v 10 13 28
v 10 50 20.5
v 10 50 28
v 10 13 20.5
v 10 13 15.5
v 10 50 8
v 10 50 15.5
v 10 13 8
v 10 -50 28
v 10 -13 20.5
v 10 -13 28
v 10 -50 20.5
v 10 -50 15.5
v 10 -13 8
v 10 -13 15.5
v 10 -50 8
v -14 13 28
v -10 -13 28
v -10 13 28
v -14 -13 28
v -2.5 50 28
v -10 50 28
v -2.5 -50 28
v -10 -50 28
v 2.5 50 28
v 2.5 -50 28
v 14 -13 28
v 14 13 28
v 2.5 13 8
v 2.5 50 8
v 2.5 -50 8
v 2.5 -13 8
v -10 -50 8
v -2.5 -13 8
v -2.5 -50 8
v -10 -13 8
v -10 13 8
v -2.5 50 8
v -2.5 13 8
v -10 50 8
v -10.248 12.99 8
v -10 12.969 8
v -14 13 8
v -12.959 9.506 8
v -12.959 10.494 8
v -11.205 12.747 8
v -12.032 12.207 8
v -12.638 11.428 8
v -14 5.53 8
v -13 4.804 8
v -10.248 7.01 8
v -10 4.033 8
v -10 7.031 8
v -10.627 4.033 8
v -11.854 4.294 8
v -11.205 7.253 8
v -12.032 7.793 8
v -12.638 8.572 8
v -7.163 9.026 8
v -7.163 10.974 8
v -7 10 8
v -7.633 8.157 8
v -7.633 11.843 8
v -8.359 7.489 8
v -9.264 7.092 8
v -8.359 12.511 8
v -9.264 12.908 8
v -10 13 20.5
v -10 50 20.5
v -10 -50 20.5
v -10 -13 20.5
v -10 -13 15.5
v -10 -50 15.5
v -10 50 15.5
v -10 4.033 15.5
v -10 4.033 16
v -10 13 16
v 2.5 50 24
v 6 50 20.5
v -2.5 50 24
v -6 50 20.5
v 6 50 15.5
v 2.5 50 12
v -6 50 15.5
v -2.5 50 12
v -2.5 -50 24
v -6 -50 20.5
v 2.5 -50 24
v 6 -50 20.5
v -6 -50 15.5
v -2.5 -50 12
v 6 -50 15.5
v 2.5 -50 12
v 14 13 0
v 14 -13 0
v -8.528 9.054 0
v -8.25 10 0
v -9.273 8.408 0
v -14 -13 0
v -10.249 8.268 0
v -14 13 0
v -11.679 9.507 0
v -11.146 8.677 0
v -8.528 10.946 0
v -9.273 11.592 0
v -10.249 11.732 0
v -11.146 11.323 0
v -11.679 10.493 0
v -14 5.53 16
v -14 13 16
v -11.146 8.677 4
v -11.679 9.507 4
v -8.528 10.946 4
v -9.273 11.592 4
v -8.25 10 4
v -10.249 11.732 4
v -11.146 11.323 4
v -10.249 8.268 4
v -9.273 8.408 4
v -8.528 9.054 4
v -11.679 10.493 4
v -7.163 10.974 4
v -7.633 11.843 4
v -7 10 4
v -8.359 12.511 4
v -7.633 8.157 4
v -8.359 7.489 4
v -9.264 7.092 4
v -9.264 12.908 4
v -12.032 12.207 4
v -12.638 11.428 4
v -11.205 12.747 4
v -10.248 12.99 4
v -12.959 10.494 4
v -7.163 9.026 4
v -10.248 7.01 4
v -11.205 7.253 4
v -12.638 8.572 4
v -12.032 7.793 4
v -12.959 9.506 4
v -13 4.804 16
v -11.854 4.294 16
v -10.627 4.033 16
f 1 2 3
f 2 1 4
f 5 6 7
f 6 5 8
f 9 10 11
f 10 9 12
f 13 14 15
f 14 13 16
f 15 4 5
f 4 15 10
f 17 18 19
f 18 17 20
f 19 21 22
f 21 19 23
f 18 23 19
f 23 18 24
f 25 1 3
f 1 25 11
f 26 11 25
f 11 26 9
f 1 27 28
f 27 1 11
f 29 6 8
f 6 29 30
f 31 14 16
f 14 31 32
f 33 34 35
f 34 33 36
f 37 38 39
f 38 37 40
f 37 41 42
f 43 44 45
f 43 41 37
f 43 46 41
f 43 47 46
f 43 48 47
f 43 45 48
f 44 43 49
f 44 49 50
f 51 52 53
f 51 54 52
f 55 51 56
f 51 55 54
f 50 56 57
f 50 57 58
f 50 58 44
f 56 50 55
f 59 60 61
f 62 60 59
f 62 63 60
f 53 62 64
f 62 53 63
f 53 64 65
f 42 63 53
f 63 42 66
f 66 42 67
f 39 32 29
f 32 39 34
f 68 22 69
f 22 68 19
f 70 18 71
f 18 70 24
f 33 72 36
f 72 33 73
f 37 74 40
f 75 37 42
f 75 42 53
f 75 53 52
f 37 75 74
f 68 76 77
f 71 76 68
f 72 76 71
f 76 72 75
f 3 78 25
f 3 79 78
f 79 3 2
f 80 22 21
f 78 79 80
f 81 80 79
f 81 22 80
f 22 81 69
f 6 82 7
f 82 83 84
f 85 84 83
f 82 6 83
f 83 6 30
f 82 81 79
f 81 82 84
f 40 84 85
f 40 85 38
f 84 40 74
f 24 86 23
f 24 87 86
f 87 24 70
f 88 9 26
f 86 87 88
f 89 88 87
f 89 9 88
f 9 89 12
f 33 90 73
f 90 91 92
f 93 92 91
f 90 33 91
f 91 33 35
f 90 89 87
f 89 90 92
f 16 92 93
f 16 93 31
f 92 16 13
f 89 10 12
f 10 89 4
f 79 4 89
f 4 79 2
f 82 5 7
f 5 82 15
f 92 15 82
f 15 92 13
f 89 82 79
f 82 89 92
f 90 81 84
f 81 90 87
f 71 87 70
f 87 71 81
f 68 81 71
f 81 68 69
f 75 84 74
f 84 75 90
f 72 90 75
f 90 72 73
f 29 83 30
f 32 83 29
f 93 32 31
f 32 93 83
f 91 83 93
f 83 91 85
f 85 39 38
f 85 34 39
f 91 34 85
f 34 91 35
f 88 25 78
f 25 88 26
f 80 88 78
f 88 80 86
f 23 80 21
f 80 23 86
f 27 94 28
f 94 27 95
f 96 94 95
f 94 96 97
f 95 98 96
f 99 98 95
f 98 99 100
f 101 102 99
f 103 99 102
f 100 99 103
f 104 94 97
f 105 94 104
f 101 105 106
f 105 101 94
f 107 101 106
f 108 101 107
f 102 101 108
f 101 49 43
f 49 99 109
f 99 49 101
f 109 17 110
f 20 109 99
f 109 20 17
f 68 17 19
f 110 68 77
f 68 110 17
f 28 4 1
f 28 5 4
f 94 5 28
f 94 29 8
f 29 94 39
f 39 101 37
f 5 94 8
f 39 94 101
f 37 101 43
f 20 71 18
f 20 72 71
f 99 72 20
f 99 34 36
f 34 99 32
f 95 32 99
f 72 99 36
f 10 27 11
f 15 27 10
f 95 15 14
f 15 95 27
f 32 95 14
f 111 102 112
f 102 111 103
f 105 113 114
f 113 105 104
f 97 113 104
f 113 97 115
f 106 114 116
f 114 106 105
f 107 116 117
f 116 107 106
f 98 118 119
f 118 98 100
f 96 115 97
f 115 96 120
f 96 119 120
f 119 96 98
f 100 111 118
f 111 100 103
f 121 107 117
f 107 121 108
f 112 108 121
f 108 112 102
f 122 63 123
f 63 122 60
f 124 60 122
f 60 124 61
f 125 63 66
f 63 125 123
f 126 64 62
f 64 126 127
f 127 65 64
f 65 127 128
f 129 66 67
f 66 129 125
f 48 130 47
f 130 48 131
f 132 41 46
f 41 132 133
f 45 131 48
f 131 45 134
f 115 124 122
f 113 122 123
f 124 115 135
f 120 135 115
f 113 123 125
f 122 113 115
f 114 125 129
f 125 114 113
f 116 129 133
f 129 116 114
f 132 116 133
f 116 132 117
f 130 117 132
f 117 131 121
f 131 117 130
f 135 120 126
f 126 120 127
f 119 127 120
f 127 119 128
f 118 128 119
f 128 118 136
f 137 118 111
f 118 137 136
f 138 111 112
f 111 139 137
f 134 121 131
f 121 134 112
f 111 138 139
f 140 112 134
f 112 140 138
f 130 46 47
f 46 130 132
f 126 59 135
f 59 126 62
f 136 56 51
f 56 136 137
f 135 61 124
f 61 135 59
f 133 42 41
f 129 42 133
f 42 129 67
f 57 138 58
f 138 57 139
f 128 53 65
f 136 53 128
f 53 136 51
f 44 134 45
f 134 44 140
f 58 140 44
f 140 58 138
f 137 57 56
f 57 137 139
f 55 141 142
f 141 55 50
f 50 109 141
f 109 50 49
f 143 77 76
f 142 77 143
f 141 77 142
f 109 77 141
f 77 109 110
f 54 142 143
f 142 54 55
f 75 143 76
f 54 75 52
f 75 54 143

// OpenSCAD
/** \file
 * Brackets for 20mm extrusion.
 *
 * These hold the panels a few mm away from the bracket.
 */

length=26;
width=20;

module bracket()
{
	translate([0,0,4]) cube([28,length,8], center=true);
	translate([12,0,(width+8)/2]) cube([4,length,width+8], center=true);
	translate([-12,0,(width+8)/2]) cube([4,length,width+8], center=true);
}

color([0,1,0]) translate([0,0,width/2+8]) extrusion(100);

render() difference()
{
	bracket();
	translate([-10,10,0]) {
		translate([0,0,-1]) cylinder(r=3.5/2, h=6, $fs=1);
		translate([0,0,4]) cylinder(r=6/2, h=4, $fs=1);
		translate([0,0,8]) cylinder(r=12/2, h=8, $fs=1);
	}
}

module extrusion(len)
{
	render() difference()
	{
		cube([width,len,width], center=true);
		translate([width/2-5/2+1,0,0]) cube([5,len+2,5], center=true);
		translate([-width/2+5/2-1,0,0]) cube([5,len+2,5], center=true);

		translate([0,0,-width/2+5/2-1]) cube([5,len+2,5], center=true);
		translate([0,0,width/2-5/2+1]) cube([5,len+2,5], center=true);
	}
}
